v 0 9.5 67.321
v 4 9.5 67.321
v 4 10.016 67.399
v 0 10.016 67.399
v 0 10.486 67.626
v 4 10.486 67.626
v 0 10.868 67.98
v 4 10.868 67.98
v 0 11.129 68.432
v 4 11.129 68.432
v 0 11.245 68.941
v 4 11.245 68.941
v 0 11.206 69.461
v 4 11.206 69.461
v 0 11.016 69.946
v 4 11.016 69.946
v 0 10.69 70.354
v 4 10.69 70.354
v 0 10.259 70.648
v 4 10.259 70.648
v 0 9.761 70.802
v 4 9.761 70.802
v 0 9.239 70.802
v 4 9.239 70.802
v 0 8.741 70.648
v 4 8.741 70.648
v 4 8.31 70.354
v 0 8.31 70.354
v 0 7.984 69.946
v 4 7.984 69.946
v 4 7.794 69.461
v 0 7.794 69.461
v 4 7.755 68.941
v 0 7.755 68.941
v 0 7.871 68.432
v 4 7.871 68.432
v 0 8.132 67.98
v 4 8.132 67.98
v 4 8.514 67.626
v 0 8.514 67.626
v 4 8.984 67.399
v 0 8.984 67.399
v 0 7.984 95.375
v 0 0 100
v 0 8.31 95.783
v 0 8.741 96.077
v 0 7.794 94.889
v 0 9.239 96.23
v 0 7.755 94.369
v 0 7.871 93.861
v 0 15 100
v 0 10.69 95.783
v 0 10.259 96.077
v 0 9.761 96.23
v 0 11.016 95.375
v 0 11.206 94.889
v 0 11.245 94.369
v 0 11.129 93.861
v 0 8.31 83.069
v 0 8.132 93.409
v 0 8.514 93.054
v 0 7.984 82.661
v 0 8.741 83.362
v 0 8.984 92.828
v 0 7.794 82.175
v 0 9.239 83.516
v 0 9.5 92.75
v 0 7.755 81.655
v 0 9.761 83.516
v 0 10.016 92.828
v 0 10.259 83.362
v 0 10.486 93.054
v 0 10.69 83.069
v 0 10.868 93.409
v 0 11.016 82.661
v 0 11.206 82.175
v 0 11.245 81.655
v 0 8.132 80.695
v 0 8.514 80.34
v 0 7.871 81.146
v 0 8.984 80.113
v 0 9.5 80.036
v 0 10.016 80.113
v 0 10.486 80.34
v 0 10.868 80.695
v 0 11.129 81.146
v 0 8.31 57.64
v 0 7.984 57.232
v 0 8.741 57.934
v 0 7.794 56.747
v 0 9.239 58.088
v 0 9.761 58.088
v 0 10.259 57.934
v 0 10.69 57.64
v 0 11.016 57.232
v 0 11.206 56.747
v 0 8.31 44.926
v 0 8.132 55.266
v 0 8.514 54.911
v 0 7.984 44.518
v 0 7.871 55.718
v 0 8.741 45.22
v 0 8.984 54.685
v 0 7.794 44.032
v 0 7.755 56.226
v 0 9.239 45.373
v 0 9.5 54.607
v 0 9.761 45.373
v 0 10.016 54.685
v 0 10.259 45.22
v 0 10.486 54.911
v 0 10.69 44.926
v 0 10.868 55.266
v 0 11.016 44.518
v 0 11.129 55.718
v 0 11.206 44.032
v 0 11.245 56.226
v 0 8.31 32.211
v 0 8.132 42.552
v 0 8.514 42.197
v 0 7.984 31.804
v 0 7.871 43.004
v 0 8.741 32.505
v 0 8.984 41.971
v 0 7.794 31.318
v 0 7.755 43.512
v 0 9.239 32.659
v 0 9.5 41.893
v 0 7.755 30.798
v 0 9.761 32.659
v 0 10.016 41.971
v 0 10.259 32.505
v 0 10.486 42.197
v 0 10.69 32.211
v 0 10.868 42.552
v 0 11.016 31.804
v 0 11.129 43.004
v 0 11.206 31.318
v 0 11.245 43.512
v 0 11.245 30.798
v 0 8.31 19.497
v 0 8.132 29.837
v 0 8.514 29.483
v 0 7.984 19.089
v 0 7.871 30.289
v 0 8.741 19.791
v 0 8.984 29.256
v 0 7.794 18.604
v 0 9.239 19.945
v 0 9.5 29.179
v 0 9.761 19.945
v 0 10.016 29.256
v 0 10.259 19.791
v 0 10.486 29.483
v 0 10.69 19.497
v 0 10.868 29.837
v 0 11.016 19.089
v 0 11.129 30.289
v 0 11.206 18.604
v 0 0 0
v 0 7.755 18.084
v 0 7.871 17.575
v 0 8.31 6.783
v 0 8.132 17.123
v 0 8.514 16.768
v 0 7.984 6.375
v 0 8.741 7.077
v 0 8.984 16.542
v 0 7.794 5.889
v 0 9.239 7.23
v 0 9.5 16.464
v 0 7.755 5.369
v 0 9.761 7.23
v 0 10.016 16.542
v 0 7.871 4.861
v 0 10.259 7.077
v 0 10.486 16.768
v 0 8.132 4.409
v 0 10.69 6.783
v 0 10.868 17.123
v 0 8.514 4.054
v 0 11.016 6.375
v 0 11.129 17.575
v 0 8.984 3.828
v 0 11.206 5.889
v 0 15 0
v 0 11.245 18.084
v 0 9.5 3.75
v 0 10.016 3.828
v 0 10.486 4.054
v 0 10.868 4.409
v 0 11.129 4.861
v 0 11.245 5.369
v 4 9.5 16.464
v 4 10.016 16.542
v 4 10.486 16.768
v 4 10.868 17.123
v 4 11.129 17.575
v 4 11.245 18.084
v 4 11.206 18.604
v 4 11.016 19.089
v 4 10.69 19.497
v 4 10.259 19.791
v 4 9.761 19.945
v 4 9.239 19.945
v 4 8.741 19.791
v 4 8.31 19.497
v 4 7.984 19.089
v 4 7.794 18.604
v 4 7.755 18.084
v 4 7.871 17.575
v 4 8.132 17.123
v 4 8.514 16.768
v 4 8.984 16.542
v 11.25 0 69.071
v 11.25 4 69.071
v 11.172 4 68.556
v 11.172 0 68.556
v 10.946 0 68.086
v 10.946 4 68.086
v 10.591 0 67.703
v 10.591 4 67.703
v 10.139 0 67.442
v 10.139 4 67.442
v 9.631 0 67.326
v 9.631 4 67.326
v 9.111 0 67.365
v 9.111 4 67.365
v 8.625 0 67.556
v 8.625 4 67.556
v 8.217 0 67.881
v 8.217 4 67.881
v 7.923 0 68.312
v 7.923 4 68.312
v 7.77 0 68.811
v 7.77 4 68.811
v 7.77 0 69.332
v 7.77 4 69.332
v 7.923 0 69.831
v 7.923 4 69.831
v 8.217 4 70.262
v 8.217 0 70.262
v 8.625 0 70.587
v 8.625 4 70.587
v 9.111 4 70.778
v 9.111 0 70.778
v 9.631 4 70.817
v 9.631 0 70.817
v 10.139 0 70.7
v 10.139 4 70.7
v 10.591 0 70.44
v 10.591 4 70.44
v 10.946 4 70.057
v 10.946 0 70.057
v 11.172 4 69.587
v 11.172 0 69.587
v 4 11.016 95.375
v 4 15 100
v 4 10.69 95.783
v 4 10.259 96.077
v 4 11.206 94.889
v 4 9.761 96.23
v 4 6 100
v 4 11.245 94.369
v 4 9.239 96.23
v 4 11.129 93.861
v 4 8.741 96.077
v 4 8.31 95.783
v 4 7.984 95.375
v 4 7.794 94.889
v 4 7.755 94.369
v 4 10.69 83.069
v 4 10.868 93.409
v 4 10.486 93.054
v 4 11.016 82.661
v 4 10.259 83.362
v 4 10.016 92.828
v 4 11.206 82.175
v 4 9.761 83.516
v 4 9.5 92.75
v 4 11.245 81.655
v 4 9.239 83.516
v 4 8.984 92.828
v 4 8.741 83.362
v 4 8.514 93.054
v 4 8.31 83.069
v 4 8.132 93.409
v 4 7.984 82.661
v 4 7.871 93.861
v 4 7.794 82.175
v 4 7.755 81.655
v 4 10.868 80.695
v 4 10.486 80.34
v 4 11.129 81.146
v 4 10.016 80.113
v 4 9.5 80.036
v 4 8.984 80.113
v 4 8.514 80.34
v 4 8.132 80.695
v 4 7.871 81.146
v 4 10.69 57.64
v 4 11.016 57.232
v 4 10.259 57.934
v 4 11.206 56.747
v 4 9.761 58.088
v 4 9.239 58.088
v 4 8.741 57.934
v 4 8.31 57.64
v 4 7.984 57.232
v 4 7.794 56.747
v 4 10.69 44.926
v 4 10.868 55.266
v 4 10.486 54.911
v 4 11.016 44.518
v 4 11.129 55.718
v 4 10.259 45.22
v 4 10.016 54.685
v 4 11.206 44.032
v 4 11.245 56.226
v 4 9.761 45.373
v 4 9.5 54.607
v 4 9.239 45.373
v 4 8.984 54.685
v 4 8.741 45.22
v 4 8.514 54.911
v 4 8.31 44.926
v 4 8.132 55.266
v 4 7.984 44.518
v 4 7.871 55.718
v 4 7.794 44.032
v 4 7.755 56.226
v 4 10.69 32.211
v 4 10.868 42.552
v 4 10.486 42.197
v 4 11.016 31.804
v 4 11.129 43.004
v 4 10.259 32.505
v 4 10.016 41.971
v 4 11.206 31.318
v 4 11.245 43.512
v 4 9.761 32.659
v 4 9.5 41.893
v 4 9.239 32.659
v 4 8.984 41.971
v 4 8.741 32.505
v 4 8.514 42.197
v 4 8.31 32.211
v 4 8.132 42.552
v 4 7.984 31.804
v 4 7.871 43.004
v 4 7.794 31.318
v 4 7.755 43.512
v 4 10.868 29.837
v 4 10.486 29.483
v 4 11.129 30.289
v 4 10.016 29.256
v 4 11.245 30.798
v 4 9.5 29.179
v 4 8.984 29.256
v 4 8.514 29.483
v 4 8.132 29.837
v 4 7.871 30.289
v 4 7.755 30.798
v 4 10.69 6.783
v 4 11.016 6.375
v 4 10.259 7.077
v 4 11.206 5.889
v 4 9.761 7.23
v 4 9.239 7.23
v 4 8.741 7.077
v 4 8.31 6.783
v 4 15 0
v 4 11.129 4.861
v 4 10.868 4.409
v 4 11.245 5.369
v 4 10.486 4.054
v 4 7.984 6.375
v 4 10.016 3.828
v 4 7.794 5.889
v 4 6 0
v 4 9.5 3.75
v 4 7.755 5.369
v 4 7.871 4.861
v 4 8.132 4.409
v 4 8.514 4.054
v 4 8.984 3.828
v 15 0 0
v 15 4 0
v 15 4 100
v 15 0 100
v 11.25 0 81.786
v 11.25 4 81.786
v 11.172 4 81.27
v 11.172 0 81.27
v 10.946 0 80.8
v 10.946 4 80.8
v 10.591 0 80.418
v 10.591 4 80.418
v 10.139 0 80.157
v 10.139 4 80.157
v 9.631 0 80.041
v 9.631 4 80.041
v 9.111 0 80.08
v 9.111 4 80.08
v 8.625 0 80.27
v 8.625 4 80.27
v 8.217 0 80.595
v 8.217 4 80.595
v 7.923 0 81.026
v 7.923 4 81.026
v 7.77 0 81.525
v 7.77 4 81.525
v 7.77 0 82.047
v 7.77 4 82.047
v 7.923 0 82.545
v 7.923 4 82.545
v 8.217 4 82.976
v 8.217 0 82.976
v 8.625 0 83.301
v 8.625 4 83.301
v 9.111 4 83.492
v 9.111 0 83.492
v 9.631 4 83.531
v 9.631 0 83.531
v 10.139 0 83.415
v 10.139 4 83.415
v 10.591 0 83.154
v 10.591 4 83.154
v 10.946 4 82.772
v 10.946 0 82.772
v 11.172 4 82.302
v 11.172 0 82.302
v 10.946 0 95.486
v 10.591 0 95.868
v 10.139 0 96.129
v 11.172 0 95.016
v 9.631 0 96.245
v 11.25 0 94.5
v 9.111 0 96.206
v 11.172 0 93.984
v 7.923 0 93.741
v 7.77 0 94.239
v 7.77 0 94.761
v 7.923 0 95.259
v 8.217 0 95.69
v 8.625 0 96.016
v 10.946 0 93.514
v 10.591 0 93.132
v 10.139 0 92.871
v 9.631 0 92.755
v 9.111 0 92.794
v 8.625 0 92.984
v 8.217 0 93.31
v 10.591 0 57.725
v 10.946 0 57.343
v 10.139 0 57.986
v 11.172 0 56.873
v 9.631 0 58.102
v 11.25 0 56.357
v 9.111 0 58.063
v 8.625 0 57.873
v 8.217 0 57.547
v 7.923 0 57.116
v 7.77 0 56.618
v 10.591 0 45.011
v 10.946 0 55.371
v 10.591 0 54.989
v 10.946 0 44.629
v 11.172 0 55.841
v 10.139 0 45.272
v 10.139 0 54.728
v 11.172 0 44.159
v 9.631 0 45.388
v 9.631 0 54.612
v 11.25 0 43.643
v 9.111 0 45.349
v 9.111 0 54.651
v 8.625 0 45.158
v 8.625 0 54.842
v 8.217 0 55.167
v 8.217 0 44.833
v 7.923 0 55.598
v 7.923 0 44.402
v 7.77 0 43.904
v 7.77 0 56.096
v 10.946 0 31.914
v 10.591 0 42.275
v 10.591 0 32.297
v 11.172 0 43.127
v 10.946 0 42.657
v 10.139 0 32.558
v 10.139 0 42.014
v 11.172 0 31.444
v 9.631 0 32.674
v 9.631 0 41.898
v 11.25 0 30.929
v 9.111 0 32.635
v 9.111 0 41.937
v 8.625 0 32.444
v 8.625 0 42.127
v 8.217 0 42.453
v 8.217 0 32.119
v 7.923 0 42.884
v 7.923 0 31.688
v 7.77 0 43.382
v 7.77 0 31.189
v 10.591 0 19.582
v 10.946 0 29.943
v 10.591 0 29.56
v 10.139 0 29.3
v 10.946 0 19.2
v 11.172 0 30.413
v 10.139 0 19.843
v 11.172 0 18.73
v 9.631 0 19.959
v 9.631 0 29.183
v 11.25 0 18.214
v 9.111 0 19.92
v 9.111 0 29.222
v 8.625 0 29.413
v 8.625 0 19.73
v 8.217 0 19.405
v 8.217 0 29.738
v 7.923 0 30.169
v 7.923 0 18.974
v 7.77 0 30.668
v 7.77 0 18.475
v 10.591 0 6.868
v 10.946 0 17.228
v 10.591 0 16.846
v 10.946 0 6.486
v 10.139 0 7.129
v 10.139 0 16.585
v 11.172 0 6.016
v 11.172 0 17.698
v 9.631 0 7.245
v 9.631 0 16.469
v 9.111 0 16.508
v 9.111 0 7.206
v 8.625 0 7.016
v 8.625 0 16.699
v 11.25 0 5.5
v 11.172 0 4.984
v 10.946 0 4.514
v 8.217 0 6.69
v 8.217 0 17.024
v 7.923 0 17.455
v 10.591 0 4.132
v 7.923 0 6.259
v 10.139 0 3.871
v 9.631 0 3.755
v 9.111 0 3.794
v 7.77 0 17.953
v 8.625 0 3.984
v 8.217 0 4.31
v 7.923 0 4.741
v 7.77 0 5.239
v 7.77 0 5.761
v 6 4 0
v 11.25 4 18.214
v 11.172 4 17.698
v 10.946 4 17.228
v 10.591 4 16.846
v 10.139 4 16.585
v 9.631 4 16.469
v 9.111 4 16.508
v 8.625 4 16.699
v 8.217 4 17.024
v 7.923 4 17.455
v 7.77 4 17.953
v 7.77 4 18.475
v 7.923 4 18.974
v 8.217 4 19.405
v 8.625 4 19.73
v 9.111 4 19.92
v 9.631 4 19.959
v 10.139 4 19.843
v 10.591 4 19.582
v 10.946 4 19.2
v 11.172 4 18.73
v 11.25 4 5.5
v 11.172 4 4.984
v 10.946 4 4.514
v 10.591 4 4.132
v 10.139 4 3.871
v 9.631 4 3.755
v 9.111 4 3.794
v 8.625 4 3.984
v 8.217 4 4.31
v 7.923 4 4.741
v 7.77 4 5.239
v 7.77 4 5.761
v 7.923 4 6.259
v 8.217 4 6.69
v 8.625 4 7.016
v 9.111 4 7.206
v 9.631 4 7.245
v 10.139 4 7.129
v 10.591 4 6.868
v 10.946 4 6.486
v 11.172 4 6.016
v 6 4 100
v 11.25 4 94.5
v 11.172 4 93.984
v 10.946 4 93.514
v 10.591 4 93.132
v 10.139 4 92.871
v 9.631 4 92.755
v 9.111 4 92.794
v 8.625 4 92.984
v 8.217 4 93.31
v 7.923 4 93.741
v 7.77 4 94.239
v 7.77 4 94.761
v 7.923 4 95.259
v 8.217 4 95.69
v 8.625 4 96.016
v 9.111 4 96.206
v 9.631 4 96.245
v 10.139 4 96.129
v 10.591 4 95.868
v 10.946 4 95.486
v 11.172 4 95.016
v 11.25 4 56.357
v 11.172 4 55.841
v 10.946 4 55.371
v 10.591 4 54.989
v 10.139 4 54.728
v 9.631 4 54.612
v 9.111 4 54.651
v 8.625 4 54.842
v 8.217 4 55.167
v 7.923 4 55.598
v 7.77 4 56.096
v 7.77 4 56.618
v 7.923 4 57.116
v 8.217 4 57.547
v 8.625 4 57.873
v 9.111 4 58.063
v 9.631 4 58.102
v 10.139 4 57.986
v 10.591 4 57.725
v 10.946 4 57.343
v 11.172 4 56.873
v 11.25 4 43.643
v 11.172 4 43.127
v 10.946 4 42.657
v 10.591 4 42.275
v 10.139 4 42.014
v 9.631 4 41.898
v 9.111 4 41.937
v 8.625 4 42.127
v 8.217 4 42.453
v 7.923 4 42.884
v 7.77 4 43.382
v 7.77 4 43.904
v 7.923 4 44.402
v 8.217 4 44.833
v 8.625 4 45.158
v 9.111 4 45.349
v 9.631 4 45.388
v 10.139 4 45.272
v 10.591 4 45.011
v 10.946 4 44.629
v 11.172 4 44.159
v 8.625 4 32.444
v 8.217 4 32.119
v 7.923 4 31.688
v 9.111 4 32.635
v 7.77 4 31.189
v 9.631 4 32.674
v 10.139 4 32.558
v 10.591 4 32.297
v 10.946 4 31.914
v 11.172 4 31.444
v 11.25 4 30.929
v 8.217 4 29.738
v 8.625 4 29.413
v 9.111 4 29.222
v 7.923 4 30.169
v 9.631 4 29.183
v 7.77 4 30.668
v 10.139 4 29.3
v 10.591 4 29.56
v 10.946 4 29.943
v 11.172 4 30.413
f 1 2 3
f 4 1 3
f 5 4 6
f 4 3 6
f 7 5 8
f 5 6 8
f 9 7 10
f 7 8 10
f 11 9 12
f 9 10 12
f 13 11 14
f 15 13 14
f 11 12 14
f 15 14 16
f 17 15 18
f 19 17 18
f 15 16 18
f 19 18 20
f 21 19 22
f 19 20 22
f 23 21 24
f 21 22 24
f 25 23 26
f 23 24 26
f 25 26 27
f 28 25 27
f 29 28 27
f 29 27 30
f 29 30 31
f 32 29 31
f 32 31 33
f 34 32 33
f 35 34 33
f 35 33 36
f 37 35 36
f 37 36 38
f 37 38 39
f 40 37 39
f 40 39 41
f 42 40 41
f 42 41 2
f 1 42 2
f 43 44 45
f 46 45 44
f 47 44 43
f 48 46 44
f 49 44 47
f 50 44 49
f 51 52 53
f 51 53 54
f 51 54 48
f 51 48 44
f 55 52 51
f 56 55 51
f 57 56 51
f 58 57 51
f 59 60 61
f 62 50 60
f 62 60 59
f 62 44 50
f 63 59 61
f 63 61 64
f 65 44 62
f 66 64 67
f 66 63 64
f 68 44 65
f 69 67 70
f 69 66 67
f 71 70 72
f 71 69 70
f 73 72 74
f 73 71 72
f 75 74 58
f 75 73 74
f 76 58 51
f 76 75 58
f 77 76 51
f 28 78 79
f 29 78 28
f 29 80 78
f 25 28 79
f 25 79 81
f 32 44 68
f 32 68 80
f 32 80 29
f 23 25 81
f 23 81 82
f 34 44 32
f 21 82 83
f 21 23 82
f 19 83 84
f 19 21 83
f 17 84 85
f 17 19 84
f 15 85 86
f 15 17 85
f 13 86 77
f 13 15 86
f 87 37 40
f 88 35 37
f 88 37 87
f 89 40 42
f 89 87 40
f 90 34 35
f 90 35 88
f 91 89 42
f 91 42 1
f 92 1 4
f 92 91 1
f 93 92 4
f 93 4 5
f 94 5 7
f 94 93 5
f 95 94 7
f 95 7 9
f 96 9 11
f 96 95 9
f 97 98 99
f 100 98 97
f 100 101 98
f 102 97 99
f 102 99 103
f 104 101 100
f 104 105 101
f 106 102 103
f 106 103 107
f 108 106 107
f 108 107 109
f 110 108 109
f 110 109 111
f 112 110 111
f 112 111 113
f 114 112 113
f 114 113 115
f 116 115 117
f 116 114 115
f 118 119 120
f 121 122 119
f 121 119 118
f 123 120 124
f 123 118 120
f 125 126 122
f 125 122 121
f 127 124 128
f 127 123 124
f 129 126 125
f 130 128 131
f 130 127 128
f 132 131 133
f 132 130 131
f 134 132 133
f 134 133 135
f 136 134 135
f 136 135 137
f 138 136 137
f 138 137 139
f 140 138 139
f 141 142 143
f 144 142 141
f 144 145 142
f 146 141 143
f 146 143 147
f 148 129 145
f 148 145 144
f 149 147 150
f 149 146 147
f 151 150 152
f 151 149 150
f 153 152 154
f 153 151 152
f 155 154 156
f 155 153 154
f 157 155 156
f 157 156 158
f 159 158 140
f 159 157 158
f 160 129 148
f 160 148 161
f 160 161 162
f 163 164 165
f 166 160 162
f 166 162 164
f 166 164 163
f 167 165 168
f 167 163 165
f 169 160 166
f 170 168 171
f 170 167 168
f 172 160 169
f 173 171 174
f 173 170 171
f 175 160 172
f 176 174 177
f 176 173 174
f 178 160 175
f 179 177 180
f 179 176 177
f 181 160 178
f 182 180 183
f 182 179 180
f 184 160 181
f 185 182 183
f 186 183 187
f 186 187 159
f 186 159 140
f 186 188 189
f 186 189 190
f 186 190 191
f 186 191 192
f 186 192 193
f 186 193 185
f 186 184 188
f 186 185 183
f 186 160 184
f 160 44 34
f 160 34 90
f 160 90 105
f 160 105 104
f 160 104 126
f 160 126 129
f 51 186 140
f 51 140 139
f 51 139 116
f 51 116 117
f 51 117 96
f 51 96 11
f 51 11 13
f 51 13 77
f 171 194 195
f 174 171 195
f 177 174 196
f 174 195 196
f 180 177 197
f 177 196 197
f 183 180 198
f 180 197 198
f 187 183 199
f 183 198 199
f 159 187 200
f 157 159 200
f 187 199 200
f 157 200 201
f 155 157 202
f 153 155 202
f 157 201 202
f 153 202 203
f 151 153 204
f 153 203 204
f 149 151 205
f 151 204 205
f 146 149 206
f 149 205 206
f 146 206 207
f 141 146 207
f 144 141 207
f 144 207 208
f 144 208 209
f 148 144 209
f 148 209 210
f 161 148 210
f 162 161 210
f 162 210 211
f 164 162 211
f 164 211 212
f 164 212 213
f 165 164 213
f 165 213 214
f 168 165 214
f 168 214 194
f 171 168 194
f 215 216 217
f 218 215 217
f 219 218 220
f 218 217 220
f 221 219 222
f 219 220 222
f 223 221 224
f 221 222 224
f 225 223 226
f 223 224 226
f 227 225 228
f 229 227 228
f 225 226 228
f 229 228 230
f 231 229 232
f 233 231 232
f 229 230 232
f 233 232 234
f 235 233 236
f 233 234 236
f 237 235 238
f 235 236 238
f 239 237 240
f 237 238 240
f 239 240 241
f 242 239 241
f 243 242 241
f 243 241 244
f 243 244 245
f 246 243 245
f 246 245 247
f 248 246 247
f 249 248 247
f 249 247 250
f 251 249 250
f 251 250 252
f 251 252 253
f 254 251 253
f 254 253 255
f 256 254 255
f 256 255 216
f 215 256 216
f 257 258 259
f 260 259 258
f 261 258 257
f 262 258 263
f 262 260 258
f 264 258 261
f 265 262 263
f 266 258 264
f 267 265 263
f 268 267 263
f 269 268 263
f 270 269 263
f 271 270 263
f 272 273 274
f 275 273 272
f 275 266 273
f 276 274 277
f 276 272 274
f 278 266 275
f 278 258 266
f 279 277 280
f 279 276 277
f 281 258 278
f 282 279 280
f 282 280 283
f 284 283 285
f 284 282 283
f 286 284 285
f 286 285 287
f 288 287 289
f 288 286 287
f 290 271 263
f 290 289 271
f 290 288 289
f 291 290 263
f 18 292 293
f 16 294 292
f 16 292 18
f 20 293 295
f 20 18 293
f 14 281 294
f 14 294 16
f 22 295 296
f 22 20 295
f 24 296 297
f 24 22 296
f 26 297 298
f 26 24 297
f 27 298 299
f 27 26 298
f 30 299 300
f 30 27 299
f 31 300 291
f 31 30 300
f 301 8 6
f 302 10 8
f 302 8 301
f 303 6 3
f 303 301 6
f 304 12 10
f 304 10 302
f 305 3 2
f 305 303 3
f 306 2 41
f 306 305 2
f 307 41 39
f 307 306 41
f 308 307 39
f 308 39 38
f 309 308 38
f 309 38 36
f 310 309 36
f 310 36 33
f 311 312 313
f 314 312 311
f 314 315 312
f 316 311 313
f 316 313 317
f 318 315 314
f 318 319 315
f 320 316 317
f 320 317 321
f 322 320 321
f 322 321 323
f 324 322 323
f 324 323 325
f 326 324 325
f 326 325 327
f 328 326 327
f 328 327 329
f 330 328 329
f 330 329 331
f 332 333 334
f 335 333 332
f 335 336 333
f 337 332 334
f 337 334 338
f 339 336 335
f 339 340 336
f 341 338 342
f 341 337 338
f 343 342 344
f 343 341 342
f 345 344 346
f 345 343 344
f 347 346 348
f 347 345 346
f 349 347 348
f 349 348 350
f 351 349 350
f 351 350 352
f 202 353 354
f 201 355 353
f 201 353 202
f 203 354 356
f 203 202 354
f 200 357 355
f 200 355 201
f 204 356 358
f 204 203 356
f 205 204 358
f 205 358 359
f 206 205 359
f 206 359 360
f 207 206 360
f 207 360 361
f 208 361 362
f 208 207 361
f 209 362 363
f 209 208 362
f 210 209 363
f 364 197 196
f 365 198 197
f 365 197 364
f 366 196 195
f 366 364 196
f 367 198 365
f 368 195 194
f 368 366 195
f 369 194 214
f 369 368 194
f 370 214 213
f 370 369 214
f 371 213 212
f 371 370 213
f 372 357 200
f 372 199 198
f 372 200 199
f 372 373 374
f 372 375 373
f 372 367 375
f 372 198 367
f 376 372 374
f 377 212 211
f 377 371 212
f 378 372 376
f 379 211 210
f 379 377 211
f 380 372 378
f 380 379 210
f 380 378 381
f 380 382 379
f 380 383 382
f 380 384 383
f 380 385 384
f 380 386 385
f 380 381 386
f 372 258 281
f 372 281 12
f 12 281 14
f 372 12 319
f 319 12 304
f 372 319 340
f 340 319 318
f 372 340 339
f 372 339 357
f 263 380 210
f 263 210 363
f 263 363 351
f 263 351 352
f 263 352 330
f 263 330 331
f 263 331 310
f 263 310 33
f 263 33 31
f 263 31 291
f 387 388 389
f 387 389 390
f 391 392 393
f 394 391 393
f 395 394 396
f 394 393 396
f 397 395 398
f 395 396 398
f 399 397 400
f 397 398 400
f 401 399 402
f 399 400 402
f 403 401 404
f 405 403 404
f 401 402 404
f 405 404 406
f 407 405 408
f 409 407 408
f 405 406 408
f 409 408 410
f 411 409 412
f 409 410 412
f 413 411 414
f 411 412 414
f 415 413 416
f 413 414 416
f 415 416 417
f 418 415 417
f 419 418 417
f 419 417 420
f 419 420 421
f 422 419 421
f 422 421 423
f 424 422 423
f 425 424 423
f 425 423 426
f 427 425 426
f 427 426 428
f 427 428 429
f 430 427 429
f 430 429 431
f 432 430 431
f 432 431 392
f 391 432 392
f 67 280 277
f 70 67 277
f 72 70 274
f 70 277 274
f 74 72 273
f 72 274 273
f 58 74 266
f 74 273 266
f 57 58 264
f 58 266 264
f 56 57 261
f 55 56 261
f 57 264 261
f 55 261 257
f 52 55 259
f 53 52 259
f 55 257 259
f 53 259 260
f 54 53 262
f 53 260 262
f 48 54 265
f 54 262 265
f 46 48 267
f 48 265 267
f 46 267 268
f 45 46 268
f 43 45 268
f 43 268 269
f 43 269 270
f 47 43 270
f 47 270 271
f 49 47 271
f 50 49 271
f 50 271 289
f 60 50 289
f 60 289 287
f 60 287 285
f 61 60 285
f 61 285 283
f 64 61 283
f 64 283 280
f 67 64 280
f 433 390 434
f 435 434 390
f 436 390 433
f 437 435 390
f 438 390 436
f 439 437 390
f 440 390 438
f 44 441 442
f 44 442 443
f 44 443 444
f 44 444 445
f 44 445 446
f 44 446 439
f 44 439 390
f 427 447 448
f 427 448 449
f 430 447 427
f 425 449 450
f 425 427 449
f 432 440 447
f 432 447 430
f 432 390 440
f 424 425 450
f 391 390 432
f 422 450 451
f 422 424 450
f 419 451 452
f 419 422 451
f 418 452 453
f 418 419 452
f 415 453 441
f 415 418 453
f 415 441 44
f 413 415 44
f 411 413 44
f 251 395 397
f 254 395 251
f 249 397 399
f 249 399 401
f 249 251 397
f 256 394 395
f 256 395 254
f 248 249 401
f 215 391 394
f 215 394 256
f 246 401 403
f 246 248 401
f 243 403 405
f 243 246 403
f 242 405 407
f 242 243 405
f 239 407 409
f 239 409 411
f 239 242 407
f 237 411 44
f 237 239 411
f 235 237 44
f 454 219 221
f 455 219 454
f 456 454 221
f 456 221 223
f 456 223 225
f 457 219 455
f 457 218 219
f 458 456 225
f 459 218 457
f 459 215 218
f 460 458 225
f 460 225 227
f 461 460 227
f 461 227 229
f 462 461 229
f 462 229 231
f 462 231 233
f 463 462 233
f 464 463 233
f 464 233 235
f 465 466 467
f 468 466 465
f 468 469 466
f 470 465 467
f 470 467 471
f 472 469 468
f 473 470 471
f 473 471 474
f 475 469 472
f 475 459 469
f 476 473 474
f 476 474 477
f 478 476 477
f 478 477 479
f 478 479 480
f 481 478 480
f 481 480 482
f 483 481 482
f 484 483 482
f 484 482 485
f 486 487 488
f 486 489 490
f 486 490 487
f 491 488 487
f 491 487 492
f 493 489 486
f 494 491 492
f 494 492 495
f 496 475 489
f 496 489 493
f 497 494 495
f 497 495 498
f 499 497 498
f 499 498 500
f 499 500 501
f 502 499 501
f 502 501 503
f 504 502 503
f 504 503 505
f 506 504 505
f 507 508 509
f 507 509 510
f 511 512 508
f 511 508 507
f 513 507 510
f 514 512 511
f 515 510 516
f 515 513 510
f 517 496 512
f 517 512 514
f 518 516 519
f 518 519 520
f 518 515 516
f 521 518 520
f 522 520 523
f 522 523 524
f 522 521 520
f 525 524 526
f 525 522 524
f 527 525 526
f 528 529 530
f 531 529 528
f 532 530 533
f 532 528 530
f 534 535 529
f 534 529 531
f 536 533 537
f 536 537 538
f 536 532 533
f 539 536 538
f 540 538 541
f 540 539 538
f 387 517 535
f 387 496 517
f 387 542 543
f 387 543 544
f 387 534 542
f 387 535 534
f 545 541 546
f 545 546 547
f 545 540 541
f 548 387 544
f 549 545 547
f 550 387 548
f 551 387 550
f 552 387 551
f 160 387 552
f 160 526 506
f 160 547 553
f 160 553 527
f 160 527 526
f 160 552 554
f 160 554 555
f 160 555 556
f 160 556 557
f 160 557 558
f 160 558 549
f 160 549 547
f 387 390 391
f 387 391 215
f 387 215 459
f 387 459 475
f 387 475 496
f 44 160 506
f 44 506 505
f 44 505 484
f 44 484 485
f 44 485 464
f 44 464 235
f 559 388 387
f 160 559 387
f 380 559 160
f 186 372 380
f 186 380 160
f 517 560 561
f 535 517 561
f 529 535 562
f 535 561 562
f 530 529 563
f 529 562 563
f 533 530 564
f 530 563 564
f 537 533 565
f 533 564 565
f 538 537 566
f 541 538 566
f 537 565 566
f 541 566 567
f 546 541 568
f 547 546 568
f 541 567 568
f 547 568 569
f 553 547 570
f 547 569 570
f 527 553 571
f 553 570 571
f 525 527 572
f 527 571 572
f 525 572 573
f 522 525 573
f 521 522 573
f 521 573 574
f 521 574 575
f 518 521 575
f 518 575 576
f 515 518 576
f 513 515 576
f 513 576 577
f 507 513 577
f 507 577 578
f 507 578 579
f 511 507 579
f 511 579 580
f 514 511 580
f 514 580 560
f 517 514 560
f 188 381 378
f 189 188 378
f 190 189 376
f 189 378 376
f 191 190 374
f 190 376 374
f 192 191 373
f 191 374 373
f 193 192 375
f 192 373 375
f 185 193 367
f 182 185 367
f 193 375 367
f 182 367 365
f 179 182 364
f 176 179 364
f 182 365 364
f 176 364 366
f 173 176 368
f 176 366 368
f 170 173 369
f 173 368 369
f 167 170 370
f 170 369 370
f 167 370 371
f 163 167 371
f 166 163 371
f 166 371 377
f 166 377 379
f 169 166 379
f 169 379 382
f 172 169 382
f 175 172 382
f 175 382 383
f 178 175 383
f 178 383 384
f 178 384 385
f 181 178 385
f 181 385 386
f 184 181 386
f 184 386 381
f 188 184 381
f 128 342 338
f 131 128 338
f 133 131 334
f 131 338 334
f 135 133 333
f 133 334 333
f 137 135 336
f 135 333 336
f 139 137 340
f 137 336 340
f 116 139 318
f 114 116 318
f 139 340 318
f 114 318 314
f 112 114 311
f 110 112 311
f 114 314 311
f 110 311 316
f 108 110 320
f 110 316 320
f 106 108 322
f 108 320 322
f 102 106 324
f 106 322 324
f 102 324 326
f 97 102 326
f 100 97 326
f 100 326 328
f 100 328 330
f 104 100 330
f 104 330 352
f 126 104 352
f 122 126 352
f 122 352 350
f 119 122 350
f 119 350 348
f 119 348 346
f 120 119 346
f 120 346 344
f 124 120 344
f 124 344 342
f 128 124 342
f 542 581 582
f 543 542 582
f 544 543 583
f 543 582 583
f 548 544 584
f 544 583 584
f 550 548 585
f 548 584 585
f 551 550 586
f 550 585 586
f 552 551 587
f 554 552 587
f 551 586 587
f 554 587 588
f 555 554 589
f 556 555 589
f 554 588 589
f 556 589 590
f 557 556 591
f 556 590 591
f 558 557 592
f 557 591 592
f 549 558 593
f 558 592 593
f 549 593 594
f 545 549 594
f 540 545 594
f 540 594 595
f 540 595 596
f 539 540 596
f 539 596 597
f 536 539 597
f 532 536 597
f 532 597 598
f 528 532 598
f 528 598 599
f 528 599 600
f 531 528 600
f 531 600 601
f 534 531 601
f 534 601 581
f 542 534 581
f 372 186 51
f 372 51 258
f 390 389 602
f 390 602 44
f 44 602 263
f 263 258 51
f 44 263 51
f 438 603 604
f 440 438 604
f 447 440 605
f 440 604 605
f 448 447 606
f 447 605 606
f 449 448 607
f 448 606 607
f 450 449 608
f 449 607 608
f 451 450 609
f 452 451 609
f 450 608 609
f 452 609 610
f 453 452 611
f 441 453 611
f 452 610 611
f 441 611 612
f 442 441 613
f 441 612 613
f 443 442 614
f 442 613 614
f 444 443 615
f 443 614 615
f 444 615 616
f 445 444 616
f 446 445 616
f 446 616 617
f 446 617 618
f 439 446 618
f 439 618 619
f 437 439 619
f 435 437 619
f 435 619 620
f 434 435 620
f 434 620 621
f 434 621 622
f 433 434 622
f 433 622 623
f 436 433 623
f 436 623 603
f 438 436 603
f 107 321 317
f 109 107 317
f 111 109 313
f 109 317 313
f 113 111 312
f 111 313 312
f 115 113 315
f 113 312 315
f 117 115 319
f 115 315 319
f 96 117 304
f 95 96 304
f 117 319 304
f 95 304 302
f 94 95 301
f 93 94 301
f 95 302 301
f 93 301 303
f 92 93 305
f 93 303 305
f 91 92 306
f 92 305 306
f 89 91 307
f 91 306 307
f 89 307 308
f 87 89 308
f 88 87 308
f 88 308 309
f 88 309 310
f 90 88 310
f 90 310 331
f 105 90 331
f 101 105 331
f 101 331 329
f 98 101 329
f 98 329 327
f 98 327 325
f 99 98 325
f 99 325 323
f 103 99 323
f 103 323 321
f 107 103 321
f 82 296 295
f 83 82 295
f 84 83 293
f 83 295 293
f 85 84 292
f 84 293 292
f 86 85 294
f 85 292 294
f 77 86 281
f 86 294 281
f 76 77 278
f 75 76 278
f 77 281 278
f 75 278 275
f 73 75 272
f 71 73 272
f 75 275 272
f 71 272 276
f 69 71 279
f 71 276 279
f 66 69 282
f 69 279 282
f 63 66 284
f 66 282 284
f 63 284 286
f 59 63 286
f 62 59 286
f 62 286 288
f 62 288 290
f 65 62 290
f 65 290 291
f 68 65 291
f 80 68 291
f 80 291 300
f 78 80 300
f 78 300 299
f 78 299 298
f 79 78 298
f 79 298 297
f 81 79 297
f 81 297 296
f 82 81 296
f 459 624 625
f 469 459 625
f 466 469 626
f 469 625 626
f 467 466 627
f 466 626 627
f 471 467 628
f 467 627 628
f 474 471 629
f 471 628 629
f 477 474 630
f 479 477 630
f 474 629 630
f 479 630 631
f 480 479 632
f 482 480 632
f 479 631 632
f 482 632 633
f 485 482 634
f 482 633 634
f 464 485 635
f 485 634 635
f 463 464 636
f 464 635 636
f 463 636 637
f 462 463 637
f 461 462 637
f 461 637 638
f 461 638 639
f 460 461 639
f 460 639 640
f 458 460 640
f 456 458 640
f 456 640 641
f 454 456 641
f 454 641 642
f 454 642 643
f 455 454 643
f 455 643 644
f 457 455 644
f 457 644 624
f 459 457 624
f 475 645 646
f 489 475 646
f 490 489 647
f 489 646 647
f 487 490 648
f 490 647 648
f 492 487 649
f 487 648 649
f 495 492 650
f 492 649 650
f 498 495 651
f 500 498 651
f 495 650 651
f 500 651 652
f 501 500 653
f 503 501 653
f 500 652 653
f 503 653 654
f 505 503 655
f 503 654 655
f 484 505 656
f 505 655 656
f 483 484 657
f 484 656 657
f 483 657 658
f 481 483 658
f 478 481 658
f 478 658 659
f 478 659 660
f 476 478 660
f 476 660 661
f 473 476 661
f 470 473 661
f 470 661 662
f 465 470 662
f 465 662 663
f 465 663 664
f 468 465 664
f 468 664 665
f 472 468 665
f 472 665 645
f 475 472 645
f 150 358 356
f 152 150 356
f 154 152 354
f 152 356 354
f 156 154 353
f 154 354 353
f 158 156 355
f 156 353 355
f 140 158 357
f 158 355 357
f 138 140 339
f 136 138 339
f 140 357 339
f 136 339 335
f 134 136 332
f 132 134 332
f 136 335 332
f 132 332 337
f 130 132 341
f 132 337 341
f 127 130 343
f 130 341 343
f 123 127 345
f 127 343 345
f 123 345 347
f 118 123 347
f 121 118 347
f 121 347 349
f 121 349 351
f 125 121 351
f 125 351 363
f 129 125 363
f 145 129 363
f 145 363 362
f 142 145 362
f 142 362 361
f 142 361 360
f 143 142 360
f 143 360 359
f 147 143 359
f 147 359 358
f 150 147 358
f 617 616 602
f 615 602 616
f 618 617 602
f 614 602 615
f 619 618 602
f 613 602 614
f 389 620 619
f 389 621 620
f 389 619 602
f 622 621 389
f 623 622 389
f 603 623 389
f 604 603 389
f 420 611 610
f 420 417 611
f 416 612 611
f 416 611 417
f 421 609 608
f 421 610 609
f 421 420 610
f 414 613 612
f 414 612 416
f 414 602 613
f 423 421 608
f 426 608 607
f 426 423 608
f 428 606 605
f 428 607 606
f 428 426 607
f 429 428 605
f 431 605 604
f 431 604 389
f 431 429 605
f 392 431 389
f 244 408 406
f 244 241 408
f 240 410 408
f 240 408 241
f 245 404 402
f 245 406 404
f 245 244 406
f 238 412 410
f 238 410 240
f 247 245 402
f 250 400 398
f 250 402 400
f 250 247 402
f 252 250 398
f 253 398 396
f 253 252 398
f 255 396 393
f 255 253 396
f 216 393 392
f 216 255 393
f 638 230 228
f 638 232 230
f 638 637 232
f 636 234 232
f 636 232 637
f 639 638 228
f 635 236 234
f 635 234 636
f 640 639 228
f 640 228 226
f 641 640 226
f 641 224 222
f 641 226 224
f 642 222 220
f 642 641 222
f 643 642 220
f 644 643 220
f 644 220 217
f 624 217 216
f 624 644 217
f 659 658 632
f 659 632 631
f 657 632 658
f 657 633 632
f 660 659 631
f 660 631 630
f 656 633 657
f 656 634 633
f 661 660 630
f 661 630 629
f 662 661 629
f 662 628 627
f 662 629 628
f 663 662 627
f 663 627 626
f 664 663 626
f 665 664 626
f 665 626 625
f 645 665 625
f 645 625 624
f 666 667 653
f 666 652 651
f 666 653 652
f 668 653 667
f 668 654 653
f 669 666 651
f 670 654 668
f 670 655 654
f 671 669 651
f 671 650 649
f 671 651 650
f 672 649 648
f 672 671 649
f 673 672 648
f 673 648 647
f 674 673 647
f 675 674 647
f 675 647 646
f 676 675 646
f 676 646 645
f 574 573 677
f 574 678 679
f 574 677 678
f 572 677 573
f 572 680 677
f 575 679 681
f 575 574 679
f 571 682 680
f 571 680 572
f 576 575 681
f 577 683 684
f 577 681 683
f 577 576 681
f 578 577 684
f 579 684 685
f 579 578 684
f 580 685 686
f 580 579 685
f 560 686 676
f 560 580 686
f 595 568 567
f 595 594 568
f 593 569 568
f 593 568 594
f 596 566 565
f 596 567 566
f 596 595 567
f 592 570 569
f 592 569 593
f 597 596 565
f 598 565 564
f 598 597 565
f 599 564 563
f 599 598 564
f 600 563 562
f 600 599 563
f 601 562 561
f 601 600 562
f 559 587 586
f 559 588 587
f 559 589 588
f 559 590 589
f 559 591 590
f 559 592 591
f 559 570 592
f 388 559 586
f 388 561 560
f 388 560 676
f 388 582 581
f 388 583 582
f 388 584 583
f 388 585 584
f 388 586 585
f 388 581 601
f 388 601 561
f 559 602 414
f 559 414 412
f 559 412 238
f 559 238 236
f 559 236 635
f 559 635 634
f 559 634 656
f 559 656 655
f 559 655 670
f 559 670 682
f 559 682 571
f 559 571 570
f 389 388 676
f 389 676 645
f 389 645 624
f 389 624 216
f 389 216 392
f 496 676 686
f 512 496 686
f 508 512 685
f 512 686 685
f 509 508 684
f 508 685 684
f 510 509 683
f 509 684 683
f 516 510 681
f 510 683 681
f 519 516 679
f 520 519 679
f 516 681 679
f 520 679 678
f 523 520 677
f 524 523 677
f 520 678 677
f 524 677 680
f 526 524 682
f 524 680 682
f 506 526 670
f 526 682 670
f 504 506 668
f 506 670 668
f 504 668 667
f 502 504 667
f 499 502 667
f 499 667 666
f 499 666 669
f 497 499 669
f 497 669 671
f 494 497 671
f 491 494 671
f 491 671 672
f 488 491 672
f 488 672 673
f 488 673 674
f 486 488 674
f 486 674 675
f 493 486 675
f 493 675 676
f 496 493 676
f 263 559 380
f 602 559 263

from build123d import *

# Parameters (mm, degrees)
RESSALTO_EXTRUS_O1_DEPTH = 100
ESBO_O2_R                = 1.75
CORTE_EXTRUS_O1_DEPTH    = 100
PADR_O_LINEAR1_COUNT     = 8
PADR_O_LINEAR1_PITCH     = 12.714285714
ESBO_O3_R                = 1.75
CORTE_EXTRUS_O2_DEPTH    = 100
PADR_O_LINEAR2_COUNT     = 8
PADR_O_LINEAR2_PITCH     = 12.714285714
CHANFRO1_SIZE            = 2


with BuildPart() as part:
    # Esboço1 → Ressalto-extrusão1 (new body)
    with BuildSketch(Plane.XY):
        Polygon((0, 0), (0, 15), (4, 15), (4, 4), (15, 4), (15, 0), align=None)
    extrude(amount=RESSALTO_EXTRUS_O1_DEPTH)

    # Esboço2 → Corte-extrusão1 (cut)
    with BuildSketch(Plane(origin=(4, 0, 0), x_dir=(0, 0, -1), z_dir=(1, 0, 0))):
        with Locations((-94.5, 9.5)):
            Circle(ESBO_O2_R)
    corte_extrus_o1 = extrude(amount=-CORTE_EXTRUS_O1_DEPTH, mode=Mode.SUBTRACT)

    # Padrão linear1: Corte-extrusão1 ×8
    with Locations(*[(0, 0, -i * PADR_O_LINEAR1_PITCH) for i in range(1, PADR_O_LINEAR1_COUNT)]):
        add(corte_extrus_o1, mode=Mode.SUBTRACT)

    # Esboço3 → Corte-extrusão2 (cut)
    with BuildSketch(Plane(origin=(0, 4, 0), x_dir=(1, 0, 0), z_dir=(0, 1, 0))):
        with Locations((9.5, -94.5)):
            Circle(ESBO_O3_R)
    corte_extrus_o2 = extrude(amount=-CORTE_EXTRUS_O2_DEPTH, mode=Mode.SUBTRACT)

    # Padrão linear2: Corte-extrusão2 ×8
    with Locations(*[(0, 0, -i * PADR_O_LINEAR2_PITCH) for i in range(1, PADR_O_LINEAR2_COUNT)]):
        add(corte_extrus_o2, mode=Mode.SUBTRACT)

    # Chanfro1
    chanfro1_edges = [part.edges().sort_by_distance(p)[0] for p in [
        (4, 4, 50),
    ]]
    chamfer(chanfro1_edges, length=CHANFRO1_SIZE)


solid = part.part
